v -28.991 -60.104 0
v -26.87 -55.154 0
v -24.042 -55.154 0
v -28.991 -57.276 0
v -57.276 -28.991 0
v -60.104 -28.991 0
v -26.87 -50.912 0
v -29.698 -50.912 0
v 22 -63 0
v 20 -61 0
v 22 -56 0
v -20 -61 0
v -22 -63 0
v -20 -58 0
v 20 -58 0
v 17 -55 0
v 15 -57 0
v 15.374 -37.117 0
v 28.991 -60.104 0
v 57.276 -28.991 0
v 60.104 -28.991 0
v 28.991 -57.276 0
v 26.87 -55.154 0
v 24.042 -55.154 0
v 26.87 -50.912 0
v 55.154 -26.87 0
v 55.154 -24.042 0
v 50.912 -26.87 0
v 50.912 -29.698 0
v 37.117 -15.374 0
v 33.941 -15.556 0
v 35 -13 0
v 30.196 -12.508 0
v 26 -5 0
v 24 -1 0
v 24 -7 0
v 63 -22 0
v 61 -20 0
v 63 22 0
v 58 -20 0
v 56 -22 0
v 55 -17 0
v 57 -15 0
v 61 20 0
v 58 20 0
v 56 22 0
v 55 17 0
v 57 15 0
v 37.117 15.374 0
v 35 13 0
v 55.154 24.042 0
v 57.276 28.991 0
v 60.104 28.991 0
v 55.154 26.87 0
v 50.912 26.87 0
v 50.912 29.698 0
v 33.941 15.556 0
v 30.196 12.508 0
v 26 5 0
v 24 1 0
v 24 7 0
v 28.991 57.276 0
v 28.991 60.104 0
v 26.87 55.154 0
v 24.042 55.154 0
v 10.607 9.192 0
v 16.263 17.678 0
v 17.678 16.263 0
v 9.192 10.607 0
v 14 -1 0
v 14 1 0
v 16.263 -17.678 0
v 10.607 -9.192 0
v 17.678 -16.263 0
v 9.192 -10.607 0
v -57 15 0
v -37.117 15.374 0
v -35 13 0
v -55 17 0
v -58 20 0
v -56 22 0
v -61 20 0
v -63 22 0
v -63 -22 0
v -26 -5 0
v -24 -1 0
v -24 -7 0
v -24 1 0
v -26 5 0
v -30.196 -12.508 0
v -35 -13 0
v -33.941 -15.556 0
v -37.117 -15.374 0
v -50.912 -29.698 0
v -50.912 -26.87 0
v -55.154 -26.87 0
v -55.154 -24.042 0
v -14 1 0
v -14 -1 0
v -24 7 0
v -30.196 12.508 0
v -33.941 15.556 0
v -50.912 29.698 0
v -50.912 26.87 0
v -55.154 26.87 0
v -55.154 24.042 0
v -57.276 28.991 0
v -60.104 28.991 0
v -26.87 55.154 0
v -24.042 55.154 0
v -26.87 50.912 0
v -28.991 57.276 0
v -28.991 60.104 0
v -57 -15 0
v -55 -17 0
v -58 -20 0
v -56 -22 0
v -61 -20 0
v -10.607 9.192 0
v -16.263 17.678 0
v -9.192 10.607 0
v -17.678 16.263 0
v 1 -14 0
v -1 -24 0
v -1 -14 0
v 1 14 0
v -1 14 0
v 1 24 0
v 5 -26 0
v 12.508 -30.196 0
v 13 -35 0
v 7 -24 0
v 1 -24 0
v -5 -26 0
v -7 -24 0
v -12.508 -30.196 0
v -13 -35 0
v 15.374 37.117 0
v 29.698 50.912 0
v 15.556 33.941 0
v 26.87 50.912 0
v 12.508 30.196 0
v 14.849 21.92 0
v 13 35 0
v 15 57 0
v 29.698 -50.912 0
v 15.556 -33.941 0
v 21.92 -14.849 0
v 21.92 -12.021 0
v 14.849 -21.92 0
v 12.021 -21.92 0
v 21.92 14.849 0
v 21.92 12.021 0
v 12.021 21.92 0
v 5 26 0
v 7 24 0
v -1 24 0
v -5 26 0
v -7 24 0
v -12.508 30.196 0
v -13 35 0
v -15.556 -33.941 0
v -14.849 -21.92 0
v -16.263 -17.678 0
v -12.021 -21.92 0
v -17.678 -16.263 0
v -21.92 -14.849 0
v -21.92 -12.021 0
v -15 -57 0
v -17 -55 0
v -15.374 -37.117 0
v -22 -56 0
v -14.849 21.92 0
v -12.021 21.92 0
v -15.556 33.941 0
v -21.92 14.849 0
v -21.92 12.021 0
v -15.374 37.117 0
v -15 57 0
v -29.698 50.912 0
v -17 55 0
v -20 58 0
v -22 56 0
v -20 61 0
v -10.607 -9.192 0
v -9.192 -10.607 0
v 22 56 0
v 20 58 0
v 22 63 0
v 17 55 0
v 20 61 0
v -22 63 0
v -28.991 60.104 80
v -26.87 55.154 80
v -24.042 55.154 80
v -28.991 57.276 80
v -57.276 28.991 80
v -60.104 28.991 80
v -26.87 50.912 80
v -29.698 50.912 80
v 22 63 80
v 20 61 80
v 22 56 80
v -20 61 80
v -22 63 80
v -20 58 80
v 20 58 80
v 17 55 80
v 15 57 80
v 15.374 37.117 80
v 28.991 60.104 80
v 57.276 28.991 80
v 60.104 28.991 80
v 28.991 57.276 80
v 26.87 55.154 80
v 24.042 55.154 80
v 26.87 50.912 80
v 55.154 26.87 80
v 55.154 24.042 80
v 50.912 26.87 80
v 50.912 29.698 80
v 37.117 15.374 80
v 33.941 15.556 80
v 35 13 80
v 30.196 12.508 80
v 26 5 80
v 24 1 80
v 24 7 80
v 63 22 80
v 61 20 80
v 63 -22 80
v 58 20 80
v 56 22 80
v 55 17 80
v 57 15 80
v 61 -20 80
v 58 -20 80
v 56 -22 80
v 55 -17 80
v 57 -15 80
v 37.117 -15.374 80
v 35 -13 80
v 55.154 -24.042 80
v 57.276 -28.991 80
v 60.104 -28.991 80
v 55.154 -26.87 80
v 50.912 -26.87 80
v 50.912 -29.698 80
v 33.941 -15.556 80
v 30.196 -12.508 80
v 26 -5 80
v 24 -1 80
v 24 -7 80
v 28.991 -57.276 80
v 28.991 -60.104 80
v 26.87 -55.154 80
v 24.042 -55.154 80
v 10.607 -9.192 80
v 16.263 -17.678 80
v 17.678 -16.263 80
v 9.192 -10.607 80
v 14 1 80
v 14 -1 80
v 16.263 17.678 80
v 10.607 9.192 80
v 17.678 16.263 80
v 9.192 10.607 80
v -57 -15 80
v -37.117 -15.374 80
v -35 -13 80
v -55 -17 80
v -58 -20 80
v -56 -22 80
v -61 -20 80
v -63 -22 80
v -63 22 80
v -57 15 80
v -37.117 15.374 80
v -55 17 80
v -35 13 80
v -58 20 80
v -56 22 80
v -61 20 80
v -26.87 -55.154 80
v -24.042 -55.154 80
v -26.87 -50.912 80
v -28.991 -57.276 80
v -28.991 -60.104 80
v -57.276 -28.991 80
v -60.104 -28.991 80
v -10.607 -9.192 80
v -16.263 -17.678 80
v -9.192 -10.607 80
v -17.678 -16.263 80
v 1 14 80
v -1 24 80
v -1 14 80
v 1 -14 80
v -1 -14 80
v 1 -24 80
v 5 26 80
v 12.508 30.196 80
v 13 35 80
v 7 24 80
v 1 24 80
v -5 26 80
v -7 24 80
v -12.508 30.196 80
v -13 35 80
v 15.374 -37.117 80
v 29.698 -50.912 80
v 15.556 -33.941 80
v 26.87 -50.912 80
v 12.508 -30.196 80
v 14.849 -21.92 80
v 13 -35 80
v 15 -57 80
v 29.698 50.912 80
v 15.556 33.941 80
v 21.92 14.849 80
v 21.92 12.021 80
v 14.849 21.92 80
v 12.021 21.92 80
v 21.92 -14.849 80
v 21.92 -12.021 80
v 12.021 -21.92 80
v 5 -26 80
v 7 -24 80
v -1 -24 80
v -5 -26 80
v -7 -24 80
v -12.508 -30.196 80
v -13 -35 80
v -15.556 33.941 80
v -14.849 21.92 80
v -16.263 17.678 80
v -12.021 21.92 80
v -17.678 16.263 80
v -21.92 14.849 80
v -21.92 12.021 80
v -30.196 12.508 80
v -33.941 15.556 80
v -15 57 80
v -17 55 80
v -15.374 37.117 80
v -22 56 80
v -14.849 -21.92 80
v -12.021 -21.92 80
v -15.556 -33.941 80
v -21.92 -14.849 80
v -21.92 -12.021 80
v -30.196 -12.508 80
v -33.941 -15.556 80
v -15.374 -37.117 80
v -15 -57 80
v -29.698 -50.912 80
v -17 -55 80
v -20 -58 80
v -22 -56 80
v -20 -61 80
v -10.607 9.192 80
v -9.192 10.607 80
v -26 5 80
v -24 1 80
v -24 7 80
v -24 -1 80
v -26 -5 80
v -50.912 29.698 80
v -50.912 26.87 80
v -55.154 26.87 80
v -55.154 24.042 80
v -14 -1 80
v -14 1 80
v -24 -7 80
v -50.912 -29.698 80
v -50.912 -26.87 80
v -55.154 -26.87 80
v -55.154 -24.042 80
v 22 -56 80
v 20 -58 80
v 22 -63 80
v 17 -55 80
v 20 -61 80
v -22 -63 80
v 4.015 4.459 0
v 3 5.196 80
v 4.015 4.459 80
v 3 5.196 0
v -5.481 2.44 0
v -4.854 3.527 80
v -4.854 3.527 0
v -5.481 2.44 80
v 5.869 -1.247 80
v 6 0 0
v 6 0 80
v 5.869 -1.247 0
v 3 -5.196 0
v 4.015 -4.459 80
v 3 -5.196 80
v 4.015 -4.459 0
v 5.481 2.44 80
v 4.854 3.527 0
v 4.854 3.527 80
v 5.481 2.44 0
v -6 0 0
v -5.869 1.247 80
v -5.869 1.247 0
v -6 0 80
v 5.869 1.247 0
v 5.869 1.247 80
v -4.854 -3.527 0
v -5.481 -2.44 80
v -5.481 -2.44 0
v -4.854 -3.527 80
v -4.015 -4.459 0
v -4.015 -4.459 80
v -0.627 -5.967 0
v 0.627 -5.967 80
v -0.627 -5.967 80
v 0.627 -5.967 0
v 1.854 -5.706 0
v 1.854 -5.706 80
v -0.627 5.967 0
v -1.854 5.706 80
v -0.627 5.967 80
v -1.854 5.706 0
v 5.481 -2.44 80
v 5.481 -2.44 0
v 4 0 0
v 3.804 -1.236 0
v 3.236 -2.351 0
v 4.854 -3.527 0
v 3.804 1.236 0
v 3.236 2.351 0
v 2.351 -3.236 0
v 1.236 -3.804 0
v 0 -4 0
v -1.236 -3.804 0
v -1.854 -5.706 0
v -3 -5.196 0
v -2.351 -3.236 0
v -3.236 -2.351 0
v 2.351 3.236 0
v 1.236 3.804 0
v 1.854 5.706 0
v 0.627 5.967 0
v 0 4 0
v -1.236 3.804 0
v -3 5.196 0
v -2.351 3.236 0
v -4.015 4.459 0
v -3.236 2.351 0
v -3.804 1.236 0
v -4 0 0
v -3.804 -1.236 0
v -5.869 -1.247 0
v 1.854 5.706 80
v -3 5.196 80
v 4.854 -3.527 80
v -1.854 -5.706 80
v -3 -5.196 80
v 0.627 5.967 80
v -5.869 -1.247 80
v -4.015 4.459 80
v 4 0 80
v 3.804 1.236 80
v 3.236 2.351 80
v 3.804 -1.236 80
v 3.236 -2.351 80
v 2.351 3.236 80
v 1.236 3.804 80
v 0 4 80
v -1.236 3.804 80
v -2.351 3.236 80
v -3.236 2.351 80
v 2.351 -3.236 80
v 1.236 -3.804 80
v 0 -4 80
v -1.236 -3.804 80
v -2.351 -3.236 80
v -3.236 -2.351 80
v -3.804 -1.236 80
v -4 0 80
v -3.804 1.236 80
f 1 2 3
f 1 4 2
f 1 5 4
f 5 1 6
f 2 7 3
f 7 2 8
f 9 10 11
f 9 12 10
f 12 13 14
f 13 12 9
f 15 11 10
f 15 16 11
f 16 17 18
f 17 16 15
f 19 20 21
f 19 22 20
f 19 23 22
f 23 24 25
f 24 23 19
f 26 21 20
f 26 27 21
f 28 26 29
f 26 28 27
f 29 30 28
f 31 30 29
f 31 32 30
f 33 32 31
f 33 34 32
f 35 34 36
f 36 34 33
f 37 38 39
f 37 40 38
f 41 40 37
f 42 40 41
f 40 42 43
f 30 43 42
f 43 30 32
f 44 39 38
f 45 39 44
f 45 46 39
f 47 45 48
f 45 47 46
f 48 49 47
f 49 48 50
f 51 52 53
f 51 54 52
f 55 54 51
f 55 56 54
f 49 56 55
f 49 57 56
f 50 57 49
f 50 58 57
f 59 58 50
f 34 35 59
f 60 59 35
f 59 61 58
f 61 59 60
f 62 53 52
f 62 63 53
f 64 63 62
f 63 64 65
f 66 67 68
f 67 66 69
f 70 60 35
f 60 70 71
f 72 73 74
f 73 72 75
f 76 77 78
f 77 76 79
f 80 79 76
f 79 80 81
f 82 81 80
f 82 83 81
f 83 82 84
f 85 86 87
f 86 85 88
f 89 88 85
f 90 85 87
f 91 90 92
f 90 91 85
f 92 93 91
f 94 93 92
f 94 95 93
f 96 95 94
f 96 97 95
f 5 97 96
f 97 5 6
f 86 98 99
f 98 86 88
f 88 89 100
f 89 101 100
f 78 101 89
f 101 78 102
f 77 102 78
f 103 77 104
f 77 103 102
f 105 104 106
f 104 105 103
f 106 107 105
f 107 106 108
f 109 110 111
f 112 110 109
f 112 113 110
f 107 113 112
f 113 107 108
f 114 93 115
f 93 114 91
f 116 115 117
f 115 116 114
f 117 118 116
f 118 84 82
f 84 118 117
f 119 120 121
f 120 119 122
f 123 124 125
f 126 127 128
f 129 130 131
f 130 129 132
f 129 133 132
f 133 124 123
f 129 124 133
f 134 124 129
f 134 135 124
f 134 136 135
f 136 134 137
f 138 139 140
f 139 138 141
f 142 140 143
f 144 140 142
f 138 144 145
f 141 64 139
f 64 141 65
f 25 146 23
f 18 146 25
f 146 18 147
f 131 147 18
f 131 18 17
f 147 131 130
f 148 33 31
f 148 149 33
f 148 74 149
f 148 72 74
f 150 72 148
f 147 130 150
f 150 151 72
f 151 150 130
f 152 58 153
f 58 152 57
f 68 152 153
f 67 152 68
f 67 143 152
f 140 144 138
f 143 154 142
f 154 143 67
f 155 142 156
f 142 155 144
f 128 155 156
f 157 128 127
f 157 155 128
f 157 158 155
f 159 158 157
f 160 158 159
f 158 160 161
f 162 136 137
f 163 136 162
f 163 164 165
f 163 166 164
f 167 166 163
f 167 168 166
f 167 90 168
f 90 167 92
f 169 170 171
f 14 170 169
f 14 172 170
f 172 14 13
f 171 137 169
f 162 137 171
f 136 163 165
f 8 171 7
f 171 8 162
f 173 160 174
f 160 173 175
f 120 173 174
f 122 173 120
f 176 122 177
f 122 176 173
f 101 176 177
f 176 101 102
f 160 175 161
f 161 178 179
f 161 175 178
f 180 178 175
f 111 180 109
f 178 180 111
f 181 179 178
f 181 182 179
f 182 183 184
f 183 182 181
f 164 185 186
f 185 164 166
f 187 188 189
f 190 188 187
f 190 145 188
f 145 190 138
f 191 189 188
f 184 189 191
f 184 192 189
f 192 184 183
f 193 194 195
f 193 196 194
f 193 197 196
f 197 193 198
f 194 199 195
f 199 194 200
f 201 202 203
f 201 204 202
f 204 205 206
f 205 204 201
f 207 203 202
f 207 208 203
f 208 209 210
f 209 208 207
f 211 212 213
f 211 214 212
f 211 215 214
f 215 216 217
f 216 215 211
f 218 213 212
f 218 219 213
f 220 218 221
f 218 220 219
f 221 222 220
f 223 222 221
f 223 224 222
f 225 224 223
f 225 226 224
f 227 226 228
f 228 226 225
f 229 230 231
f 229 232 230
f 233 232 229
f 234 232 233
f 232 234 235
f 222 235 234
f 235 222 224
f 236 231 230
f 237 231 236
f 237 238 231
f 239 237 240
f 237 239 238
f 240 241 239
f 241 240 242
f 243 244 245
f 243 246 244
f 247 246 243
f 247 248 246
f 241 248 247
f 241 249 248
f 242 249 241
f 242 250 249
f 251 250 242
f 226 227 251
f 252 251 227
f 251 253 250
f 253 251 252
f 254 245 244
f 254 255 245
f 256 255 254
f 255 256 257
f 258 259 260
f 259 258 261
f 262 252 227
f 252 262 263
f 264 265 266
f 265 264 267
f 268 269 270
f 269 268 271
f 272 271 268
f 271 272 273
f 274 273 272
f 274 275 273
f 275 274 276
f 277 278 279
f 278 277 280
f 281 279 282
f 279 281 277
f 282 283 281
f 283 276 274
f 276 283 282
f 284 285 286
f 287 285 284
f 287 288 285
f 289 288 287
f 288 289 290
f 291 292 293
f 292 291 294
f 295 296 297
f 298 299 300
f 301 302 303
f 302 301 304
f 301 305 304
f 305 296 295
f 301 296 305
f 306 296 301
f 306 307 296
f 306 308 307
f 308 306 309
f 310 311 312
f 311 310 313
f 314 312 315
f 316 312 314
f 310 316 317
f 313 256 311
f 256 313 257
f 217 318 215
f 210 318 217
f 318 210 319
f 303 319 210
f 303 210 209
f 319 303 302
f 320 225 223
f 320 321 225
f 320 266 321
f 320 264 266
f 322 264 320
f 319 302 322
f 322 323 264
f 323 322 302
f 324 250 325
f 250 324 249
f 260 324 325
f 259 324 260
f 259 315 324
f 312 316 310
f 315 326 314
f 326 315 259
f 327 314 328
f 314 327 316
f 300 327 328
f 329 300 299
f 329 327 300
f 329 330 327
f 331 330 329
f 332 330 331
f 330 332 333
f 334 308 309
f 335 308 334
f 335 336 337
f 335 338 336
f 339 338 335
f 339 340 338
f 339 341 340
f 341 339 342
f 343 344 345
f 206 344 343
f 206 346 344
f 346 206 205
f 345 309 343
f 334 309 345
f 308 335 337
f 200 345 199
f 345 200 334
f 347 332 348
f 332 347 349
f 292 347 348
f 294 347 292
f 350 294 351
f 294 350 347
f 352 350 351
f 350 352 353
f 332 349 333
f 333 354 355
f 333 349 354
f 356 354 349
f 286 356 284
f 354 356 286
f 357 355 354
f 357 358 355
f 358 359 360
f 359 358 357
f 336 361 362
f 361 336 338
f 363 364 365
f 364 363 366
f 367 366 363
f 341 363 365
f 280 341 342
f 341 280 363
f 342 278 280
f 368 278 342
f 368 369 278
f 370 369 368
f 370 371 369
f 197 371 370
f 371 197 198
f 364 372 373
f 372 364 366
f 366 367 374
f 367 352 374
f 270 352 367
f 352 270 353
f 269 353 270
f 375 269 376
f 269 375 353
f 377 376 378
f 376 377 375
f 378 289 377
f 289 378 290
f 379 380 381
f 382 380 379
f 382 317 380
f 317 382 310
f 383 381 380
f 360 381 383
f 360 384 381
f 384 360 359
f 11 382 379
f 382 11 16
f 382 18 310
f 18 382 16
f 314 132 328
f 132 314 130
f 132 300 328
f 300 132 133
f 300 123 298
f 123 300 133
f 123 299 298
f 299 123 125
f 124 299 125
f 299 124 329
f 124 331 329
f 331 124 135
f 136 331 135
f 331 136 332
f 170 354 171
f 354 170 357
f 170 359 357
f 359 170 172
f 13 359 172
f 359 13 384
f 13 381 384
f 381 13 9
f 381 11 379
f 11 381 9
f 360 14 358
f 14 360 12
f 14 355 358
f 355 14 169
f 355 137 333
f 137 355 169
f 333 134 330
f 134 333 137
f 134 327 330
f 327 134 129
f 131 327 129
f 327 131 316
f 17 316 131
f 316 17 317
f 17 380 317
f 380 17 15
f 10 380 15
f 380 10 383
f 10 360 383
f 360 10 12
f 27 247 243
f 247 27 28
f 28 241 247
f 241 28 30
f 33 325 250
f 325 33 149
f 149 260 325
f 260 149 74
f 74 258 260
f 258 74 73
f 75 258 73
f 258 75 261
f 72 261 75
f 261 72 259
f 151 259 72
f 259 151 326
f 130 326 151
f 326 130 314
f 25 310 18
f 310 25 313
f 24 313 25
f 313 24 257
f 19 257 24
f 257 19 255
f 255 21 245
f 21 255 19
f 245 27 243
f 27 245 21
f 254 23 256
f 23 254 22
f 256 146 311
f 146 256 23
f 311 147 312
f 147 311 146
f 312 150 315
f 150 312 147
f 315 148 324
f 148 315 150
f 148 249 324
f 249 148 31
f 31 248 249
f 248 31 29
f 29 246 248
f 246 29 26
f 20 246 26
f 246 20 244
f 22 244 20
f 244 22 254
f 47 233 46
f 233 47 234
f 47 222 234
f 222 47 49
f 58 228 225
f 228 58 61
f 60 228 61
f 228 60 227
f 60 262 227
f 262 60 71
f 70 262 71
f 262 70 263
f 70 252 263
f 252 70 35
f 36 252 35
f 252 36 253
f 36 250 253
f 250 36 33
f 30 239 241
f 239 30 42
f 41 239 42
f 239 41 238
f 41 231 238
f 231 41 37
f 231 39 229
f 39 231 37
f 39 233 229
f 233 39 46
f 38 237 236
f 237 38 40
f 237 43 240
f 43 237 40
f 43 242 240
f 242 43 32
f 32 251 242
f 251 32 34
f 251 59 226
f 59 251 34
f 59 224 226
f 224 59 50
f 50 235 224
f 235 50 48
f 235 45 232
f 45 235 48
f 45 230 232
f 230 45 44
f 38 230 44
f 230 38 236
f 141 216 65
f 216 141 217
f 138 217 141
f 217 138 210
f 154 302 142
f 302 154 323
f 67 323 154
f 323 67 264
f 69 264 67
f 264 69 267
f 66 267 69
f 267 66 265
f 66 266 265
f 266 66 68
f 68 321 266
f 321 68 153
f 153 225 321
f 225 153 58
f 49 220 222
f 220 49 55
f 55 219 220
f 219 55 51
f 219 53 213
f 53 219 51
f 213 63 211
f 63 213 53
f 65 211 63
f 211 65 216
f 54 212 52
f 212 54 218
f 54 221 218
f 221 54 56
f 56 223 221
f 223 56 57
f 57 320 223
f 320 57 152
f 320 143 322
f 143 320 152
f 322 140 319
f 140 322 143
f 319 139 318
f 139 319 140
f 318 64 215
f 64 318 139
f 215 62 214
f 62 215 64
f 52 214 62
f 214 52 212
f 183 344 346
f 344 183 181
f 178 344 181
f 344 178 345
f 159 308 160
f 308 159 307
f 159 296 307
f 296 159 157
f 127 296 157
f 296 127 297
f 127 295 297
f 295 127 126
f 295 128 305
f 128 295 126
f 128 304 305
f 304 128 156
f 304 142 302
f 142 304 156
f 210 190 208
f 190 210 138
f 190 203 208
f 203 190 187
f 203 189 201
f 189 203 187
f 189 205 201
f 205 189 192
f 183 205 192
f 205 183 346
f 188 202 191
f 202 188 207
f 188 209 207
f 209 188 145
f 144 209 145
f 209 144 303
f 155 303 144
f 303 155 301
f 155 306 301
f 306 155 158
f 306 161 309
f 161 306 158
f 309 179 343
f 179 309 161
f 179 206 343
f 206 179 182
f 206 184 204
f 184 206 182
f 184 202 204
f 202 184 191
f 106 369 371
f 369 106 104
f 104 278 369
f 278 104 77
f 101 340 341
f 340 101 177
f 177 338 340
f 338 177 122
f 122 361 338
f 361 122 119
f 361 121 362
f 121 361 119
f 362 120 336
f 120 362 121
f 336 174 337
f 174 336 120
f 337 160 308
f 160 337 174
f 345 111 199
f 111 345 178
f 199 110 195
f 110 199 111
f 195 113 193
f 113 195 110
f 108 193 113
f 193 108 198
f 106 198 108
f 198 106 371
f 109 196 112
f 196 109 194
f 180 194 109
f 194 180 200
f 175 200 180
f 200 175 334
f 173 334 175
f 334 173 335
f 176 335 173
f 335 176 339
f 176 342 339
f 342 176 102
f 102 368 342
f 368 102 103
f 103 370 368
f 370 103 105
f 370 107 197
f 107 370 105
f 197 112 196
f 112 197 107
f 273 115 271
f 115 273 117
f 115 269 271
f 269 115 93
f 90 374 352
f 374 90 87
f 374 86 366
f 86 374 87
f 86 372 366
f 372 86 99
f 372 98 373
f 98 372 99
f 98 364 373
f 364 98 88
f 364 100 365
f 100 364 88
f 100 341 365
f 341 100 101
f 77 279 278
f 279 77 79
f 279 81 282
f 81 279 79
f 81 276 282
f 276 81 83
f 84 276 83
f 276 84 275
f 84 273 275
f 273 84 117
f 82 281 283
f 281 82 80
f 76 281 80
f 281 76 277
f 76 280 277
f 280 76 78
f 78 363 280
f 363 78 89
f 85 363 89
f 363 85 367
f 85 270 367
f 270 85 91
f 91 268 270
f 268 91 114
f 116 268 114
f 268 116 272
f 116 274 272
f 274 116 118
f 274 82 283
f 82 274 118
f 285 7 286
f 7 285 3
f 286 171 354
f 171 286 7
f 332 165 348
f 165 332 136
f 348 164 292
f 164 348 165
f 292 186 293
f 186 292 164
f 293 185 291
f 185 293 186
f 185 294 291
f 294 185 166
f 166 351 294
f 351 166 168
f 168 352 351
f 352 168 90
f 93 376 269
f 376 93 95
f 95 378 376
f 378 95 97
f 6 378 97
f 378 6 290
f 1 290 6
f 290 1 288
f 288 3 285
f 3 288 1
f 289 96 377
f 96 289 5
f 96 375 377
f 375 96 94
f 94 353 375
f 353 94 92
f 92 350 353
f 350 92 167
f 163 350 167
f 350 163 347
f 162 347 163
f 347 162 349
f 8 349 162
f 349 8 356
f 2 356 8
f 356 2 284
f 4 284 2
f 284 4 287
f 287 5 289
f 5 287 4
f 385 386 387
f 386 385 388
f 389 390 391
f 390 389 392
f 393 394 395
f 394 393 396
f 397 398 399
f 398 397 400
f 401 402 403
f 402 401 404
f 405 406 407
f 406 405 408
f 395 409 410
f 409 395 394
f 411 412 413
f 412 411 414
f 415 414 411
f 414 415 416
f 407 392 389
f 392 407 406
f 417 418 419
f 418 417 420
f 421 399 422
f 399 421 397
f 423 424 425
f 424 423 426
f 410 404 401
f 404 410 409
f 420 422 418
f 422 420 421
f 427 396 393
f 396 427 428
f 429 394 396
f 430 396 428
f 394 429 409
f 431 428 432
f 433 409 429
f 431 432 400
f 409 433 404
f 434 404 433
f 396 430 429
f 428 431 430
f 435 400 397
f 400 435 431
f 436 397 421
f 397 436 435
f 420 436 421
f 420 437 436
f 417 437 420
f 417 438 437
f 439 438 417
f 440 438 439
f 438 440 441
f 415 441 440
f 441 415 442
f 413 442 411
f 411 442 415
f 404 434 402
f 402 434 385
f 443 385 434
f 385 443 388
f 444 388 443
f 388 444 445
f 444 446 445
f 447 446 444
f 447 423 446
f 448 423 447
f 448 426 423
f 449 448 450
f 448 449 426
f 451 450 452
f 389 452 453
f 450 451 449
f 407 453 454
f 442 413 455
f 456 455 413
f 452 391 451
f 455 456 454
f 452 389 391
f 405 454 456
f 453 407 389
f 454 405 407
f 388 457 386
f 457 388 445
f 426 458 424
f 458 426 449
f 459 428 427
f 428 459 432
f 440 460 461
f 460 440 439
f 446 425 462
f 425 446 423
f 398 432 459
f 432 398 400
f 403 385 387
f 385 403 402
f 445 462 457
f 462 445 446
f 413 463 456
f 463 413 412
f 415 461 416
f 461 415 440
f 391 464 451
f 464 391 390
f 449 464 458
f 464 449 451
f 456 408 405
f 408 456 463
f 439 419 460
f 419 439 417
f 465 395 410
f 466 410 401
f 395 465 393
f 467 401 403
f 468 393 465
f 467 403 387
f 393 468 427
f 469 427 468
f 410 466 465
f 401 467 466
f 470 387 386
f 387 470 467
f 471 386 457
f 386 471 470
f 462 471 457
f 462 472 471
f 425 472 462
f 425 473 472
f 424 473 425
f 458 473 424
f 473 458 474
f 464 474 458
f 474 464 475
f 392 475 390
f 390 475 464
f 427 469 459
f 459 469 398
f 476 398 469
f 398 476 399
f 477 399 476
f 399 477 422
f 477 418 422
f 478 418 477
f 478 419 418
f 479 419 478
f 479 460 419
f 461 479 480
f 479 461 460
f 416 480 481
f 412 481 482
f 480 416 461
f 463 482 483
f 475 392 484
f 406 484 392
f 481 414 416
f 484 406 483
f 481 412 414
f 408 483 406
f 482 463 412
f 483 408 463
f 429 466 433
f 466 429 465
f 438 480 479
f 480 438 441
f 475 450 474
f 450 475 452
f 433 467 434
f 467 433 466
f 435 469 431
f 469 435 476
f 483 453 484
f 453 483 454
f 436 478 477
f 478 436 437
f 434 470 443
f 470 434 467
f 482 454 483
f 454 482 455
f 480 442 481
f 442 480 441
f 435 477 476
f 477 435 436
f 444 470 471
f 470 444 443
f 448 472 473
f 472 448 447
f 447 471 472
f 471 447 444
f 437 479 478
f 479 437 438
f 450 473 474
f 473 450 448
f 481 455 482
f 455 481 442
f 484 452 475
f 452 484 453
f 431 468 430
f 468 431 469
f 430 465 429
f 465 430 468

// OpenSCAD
// approximates a capsule 
module capsule_cutout() {
    polygon(points=[[-20,0],[20,0],[20,3],[15,4],[13,26],[5,35],[-5,35],[-13,26],[-15,4],[-20,3]]);
}

// ouline of capsule + 2mm wall
module capsule_cutout_outer() {
    polygon(points=[[-22,-2],[22,-2],[22,5],[17,6],[15,28],[7,37],[1,37],[1,47],[-1,47],[-1,37],[-7,37],[-15,28],[-17,6],[-22,5]]);
}

// inner + outer capsule, open at the end
module capsule_outline_open() {
    polygon(points=[[20,0],[20,3],[15,4],[13,26],[5,35],
                            [-5,35],[-13,26],[-15,4],[-20,3],[-20,-2],
                            [-22,-2],[-22,5],[-17,6],[-15,28],[-7,37],
                            [-1,37],[-1,65],[1,65],[1,37],
                            [7,37],[15,28],[17,6],[22,5],[22,-2],[20,-2]]);
    
    
}


module standing_column_v3(radius=69, height=80) {
    for (angle=[0,45,90,135,180,225,270,315]) {
        rotate([0,0,angle]) 
        translate([0,8-radius,0]) linear_extrude(height=height) 
        difference() {
            capsule_cutout_outer();
            capsule_cutout();
        }    
    }
    difference() {
        cylinder($fn=30, r=6, h=height);
        translate([0,0,-1]) cylinder($fn=20,r=4,h=height+2);
    }
//     difference() {
//        cylinder($fn=100,r=radius+2,h=height);
//        translate([0,0,-1]) cylinder($fn=100,r=radius,h=height+2);
//     }   
}

standing_column_v3();
